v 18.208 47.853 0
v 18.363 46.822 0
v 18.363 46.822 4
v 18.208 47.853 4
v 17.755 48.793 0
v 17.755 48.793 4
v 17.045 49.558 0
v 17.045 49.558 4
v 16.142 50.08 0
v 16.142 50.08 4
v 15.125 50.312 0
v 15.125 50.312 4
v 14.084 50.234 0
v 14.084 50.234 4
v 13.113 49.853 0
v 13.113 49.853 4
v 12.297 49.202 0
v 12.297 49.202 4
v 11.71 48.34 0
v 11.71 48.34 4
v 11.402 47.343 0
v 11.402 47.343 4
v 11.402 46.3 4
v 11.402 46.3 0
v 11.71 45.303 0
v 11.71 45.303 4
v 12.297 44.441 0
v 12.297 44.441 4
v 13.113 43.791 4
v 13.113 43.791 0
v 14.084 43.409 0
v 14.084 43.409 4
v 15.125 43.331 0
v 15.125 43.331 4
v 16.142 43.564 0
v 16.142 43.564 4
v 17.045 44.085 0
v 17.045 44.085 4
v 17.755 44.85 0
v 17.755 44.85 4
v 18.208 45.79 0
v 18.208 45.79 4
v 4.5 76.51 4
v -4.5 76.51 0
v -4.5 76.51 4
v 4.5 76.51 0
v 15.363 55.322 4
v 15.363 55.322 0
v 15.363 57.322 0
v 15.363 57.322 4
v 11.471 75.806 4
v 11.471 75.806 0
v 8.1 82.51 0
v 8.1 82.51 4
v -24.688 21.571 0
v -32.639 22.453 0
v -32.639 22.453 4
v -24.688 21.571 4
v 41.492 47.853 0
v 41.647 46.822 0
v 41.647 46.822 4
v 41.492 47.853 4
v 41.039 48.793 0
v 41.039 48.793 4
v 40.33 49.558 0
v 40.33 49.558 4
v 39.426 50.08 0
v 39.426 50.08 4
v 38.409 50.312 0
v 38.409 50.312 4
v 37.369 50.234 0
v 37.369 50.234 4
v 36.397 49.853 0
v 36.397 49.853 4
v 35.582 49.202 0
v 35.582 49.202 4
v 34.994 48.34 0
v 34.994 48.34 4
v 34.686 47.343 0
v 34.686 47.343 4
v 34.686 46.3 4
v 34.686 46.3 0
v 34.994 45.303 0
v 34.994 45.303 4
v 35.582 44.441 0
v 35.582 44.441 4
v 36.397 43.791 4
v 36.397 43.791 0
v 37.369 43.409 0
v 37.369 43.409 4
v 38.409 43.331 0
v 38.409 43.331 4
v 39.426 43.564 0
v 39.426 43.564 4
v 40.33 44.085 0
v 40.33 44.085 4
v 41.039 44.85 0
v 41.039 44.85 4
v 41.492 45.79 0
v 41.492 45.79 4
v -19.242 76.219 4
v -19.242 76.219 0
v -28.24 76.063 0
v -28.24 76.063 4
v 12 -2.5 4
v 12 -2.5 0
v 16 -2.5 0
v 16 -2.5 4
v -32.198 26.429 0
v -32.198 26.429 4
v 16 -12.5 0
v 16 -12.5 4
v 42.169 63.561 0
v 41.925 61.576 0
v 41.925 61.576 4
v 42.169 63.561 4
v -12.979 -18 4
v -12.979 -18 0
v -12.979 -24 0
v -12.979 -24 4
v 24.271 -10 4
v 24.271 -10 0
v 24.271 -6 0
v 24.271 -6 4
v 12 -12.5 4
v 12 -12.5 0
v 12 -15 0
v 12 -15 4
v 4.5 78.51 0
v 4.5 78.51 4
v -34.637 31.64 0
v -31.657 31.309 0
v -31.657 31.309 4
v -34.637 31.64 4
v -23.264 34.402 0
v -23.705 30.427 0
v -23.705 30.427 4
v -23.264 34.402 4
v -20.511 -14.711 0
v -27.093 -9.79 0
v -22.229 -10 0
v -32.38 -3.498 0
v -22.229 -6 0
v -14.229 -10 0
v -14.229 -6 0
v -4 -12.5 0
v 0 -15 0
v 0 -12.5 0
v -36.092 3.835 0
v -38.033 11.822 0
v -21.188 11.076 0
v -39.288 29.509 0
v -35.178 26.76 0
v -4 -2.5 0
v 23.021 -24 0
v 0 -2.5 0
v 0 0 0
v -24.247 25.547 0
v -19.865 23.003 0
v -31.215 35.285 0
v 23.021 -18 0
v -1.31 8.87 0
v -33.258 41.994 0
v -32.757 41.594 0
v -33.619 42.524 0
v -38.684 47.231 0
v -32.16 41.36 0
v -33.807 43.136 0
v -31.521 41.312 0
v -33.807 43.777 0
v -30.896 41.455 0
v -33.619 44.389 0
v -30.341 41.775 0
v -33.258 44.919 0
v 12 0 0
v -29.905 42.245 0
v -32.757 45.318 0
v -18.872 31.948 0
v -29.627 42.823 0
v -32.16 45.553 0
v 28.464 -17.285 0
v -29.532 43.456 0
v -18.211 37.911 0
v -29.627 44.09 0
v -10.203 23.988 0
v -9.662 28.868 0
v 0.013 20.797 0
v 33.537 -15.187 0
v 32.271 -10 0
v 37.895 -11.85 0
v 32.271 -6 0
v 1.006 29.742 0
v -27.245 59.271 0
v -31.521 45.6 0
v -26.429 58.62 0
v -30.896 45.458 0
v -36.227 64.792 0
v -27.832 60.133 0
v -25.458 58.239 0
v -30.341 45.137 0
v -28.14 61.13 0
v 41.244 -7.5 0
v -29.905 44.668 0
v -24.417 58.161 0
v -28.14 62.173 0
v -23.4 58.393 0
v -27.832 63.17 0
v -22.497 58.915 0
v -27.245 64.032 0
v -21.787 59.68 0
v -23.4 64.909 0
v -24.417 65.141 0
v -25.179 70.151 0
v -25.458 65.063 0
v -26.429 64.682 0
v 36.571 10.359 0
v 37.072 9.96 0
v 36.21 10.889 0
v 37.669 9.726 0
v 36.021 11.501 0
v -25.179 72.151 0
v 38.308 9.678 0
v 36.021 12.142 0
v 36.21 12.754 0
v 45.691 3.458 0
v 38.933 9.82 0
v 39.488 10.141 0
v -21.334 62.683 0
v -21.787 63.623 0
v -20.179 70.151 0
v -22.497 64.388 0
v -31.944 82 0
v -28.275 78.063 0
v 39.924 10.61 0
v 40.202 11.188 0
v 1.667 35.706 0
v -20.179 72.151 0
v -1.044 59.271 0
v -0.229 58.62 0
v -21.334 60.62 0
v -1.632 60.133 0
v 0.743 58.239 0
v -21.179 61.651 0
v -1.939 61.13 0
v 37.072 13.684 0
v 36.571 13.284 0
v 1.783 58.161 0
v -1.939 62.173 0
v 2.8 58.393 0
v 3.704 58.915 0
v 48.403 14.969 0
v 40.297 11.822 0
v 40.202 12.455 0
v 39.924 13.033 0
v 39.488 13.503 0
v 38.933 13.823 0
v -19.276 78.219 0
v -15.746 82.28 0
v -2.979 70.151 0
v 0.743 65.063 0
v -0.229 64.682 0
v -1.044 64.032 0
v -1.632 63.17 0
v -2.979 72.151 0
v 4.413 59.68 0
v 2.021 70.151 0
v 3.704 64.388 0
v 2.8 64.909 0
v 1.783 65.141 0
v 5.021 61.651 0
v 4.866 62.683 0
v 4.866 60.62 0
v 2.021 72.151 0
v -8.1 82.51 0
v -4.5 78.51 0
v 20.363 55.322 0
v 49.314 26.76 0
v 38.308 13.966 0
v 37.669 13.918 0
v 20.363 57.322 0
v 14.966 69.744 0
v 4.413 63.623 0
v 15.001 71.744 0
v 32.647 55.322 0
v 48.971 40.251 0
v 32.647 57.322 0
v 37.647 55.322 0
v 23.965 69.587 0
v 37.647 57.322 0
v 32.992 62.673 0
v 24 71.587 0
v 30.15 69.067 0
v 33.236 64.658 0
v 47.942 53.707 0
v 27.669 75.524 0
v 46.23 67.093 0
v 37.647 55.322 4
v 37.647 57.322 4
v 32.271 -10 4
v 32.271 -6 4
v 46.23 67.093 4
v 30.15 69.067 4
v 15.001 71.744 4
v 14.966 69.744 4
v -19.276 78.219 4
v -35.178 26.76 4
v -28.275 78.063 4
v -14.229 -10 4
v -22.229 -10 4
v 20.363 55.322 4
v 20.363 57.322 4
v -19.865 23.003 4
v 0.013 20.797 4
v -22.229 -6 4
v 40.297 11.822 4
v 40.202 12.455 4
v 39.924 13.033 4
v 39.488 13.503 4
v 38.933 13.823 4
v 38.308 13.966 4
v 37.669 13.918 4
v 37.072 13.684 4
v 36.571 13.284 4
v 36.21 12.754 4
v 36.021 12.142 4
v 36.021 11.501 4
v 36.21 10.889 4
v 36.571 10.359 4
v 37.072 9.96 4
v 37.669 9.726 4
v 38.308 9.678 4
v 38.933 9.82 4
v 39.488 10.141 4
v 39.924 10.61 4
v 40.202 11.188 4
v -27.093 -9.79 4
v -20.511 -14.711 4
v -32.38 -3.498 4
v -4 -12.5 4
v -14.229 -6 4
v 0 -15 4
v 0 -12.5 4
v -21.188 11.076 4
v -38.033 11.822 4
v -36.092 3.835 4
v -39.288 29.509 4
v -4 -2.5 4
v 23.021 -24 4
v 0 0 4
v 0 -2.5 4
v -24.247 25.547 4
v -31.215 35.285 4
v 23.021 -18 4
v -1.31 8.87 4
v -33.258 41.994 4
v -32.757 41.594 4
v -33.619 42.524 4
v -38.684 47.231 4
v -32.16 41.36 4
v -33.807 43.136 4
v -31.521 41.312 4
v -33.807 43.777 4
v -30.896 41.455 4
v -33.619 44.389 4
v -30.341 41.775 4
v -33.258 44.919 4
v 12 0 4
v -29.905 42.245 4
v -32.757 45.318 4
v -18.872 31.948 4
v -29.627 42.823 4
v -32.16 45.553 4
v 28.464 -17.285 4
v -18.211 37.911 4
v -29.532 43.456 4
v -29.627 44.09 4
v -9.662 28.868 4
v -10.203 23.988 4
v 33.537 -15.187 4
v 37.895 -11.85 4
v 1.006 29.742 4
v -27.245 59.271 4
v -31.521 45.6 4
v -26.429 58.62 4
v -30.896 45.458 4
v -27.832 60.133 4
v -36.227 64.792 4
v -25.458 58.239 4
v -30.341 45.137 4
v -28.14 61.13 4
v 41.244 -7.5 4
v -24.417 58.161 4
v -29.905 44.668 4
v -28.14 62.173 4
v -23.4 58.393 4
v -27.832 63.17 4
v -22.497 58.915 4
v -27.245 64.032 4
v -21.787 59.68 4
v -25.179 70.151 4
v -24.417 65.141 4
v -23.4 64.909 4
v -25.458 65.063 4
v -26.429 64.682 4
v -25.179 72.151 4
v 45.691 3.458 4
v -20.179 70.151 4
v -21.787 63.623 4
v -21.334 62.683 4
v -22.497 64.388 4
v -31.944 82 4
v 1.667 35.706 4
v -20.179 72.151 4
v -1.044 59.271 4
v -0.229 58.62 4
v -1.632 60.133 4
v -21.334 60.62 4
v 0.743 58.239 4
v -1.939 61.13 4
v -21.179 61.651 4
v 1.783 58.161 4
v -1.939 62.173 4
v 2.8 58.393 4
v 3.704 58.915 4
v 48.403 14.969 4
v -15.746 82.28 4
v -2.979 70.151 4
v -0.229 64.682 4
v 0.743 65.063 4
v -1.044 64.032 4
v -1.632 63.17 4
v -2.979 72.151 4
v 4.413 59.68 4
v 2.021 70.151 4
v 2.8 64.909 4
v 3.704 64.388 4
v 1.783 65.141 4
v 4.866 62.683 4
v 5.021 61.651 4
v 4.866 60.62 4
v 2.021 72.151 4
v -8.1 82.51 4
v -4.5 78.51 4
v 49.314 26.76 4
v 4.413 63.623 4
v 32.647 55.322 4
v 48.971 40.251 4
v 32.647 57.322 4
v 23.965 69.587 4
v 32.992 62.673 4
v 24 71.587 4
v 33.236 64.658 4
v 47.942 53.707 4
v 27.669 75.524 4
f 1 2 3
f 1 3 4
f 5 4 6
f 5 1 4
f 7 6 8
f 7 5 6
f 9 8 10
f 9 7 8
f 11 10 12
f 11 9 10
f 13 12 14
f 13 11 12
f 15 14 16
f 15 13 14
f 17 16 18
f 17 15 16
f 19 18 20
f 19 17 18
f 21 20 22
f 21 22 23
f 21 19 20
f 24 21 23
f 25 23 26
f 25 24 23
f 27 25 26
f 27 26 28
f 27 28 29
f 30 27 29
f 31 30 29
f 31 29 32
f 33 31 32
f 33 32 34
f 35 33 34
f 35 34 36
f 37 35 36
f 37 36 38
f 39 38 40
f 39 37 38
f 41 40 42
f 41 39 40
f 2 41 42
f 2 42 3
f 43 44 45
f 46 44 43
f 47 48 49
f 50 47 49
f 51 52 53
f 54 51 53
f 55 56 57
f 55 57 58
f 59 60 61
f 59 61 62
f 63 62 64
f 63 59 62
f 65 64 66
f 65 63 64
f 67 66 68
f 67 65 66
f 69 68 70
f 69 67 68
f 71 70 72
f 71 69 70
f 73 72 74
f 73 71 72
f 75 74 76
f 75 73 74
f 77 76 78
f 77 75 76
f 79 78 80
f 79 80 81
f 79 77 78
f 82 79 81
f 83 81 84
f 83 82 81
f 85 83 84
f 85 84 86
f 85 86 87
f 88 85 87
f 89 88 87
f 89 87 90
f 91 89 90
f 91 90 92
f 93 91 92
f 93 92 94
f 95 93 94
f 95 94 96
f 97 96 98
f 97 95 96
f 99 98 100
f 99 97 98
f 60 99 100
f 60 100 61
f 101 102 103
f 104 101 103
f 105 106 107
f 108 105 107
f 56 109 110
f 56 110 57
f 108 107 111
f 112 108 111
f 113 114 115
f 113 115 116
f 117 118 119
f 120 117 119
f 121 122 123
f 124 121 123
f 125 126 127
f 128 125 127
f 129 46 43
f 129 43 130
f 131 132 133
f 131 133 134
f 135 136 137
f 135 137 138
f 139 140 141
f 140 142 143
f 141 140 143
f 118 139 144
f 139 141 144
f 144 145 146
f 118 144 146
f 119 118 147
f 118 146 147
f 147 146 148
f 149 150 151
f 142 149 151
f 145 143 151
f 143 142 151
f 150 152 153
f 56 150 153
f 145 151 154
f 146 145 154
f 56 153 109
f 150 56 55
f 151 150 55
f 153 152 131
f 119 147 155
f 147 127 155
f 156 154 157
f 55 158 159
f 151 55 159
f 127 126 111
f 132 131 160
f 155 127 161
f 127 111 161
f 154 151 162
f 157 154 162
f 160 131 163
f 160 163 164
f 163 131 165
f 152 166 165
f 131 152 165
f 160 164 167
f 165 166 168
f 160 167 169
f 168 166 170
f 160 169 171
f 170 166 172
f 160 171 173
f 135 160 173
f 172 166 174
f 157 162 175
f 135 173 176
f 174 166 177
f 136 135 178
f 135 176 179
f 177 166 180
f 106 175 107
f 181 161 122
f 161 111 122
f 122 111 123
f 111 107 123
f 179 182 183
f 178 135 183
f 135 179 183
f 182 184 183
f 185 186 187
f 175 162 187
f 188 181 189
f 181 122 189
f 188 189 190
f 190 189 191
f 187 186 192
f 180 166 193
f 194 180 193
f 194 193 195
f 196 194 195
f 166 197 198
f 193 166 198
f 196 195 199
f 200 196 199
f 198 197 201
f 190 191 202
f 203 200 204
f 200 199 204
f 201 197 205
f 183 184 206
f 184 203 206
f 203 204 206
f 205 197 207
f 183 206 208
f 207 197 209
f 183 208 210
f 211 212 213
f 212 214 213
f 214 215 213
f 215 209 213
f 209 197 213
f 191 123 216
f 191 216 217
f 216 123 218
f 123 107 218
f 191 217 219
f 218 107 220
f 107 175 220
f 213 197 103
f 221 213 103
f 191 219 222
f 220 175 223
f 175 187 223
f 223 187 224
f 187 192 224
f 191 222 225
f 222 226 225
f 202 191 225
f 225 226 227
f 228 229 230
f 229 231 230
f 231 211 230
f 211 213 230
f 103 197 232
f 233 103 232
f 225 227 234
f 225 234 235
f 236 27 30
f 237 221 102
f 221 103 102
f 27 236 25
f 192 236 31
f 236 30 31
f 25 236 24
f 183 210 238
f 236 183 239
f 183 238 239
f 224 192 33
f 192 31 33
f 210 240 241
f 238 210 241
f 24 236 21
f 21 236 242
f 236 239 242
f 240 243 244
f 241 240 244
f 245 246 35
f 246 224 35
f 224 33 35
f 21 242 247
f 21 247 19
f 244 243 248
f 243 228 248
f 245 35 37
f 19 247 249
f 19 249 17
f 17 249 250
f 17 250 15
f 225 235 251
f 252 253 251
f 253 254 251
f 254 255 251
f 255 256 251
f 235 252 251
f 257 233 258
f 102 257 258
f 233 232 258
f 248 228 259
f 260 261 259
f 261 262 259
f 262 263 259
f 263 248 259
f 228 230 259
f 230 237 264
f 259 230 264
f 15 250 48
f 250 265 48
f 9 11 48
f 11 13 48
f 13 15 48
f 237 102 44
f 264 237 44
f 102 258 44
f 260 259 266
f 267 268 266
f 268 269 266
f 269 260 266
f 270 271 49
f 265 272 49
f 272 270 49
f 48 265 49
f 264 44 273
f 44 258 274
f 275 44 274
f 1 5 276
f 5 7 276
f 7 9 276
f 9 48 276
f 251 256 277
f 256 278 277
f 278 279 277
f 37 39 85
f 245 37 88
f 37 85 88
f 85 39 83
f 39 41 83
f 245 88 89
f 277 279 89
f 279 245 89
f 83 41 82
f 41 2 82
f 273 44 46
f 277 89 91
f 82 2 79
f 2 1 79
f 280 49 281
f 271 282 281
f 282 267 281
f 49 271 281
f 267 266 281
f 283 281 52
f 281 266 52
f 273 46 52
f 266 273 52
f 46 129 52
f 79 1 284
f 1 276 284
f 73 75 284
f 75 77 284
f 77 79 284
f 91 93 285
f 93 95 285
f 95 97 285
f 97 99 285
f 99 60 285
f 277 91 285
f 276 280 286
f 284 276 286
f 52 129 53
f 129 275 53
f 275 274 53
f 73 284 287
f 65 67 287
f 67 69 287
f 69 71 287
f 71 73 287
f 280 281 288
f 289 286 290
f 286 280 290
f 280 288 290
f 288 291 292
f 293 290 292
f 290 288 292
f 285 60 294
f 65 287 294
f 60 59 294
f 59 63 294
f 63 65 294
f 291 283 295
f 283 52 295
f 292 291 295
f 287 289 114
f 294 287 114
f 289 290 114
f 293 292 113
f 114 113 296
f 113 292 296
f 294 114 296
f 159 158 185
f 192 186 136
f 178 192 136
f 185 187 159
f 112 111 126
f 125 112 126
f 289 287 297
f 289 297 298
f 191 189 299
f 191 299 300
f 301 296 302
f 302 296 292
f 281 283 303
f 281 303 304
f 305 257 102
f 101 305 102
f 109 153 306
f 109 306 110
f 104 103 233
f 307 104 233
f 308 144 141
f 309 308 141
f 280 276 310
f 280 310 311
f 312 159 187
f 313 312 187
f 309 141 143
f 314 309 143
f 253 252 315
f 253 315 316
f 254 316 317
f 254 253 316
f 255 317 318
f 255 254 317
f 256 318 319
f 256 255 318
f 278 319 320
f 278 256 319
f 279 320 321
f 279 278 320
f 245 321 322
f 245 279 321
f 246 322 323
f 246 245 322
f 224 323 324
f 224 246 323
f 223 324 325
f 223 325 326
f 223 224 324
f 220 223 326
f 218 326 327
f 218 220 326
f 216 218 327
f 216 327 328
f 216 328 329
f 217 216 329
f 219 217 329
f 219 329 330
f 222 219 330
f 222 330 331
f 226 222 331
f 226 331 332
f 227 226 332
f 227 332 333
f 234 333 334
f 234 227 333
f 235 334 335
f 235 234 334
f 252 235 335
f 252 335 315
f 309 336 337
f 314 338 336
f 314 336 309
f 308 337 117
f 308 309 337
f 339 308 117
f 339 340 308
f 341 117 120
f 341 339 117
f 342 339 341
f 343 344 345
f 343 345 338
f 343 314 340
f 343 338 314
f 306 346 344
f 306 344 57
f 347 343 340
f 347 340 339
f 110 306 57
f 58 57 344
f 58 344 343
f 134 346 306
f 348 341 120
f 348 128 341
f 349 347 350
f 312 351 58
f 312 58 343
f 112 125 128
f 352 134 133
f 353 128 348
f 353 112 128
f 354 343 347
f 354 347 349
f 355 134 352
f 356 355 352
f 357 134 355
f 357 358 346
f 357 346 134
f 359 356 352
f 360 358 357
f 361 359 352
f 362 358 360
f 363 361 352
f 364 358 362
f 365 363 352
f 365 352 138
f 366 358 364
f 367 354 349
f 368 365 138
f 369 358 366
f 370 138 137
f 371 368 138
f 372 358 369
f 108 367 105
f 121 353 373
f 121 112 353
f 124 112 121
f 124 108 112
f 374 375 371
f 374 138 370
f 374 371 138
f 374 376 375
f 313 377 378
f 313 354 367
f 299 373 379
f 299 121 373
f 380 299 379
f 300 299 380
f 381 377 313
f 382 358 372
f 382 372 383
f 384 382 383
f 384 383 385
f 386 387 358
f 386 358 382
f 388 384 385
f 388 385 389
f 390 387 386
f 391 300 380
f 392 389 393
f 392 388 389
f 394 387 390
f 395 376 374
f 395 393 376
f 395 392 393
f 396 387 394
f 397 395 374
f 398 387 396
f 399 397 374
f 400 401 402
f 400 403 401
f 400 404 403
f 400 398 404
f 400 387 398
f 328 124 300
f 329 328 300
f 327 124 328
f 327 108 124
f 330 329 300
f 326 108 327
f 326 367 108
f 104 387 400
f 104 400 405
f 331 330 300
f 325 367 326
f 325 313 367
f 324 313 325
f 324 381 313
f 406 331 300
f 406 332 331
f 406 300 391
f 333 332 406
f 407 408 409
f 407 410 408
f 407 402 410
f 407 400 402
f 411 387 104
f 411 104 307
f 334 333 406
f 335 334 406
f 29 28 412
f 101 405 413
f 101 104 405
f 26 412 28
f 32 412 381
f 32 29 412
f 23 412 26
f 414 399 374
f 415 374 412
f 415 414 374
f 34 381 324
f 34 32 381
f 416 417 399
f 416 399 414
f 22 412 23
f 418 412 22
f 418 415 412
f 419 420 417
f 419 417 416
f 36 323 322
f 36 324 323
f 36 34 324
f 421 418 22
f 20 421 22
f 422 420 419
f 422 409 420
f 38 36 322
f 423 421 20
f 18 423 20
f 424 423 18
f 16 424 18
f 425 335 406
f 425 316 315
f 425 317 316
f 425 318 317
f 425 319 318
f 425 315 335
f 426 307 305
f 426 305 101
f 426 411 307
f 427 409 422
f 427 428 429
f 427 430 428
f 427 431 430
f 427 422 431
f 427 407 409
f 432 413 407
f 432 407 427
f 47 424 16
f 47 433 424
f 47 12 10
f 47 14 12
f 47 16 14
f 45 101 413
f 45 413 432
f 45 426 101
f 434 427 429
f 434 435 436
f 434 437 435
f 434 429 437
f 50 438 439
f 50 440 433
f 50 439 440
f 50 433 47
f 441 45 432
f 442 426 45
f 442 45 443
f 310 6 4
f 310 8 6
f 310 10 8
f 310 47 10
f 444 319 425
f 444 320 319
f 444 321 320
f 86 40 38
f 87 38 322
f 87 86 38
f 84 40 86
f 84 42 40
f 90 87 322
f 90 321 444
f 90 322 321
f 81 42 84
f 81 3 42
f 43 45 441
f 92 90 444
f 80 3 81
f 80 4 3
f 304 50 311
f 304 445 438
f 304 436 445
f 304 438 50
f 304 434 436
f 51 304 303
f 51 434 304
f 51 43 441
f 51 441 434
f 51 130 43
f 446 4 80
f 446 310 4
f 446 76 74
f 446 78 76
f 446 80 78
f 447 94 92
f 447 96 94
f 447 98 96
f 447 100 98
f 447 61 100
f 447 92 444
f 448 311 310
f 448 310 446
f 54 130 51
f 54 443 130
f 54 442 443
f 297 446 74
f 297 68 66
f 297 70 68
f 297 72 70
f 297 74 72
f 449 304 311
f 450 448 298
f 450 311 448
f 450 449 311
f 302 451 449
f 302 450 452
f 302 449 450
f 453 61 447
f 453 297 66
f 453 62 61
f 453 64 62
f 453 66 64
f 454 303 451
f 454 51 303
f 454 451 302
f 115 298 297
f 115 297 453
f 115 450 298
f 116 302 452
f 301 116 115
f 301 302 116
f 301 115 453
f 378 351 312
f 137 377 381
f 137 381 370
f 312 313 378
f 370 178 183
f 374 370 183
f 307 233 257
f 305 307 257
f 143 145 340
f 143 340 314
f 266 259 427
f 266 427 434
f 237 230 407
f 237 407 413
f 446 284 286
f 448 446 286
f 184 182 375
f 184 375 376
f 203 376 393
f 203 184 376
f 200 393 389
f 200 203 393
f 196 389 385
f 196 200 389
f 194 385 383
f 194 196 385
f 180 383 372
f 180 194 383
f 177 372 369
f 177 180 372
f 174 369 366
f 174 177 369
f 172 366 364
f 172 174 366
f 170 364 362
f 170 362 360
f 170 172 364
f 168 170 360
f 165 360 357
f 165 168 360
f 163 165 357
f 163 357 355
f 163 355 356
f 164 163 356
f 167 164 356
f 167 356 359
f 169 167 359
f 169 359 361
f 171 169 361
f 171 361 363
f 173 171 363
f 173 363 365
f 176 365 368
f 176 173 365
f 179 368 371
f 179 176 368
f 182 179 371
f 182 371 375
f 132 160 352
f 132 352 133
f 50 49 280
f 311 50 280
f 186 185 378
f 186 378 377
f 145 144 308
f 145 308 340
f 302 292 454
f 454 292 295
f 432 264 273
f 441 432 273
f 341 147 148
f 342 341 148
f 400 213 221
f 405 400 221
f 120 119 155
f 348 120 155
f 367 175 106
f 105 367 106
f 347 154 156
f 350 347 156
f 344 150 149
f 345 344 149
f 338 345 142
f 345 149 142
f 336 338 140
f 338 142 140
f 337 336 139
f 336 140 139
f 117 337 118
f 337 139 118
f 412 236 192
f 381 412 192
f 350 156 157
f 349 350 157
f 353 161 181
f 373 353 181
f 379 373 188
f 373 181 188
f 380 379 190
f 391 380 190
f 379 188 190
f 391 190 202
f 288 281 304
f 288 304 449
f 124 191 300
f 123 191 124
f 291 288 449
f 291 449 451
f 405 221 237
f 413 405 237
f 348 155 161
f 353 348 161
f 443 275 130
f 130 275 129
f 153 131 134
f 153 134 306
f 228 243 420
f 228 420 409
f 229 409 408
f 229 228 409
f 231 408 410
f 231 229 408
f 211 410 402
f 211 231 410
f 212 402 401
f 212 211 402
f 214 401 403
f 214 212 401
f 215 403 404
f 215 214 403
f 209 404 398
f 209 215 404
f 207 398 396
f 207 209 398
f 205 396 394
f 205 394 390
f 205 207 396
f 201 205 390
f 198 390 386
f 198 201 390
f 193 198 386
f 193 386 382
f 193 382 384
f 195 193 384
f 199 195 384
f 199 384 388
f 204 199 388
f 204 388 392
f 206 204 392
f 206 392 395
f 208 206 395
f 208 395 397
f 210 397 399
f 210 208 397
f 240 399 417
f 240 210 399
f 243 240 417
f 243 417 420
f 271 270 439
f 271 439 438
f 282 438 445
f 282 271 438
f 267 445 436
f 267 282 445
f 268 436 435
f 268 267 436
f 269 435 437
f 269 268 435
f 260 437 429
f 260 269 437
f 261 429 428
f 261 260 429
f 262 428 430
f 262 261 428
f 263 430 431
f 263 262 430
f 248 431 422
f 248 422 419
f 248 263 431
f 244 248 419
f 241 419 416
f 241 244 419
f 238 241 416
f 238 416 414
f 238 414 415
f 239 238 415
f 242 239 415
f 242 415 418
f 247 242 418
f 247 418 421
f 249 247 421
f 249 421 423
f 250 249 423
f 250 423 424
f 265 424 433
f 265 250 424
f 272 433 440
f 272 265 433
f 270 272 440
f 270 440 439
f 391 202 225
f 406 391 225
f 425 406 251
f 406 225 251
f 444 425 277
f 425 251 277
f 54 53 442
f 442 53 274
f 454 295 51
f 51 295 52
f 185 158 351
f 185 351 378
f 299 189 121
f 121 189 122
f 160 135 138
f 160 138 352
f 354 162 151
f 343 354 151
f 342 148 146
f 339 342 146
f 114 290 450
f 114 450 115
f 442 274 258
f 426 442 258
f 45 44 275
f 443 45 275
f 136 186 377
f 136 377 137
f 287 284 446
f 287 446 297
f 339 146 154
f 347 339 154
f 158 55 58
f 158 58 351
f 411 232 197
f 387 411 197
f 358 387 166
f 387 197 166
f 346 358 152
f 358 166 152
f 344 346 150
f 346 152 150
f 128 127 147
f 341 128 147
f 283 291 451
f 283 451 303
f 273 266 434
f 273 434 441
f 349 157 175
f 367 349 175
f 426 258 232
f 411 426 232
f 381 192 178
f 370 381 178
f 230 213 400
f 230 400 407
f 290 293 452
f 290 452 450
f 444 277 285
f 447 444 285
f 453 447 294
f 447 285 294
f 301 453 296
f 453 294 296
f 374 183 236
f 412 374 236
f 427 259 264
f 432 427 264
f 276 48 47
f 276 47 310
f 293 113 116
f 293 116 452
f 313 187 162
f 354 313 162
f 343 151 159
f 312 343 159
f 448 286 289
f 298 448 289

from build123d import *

# Parameters (mm, degrees)
SKETCH1_R           = 2.15
SKETCH1_R_2         = 3.5
SKETCH1_W           = 9.000072
SKETCH1_H           = 2
SKETCH1_W_2         = 5
BOSS_EXTRUDE1_DEPTH = 4
SKETCH2_W           = 8
SKETCH2_H           = 4
CUT_EXTRUDE1_DEPTH  = 5


with BuildPart() as part:
    # Sketch1 → Boss-Extrude1 (new body)
    with BuildSketch(Plane.XY):
        with BuildLine():
            Line((-12.978640908, -18), (-12.978640908, -24))
            Line((-12.978640908, -24), (23.021359092, -24))
            Line((23.021359092, -24), (23.021359092, -18))
            ThreePointArc((23.021359092, -18), (33.536808213, -15.187172163), (41.243562055, -7.5))
            ThreePointArc((41.243562055, -7.5), (47.269076761, 9.160930487), (49.313899811, 26.759570515))
            ThreePointArc((49.313899811, 26.759570515), (48.54170687, 46.985091914), (46.229623828, 67.092858318))
            Line((46.229623828, 67.092858318), (30.150376172, 69.067141682))
            Line((30.150376172, 69.067141682), (27.668766331, 75.523635508))
            Line((27.668766331, 75.523635508), (11.471233669, 75.806364492))
            Line((11.471233669, 75.806364492), (8.1, 82.51))
            Line((8.1, 82.51), (-8.1, 82.51))
            Line((-8.1, 82.51), (-15.746217975, 82.280462515))
            Line((-15.746217975, 82.280462515), (-31.943782025, 81.999537485))
            ThreePointArc((-31.943782025, 81.999537485), (-38.683922922, 47.231229605), (-38.032696315, 11.821617405))
            ThreePointArc((-38.032696315, 11.821617405), (-29.918009554, -6.796134249), (-12.978640908, -18))
        make_face()
        with Locations((38.147341743, 11.821617405)):
            Circle(SKETCH1_R, mode=Mode.SUBTRACT)
        with Locations((-24.678960076, 61.651218734)):
            Circle(SKETCH1_R_2, mode=Mode.SUBTRACT)
        with Locations((1.521420673, 61.651218734)):
            Circle(SKETCH1_R_2, mode=Mode.SUBTRACT)
        with Locations((14.86306514, 46.821617405)):
            Circle(SKETCH1_R_2, mode=Mode.SUBTRACT)
        with Locations((38.147341743, 46.821617405)):
            Circle(SKETCH1_R_2, mode=Mode.SUBTRACT)
        with Locations((-31.681501662, 43.456405989)):
            Circle(SKETCH1_R, mode=Mode.SUBTRACT)
        with Locations((0, 77.51)):
            Rectangle(SKETCH1_W, SKETCH1_H, mode=Mode.SUBTRACT)
        Polygon((-4, -2.5), (0, -2.5), (0, 0), (12, 0), (12, -2.5), (16, -2.5), (16, -12.5), (12, -12.5), (12, -15), (0, -15), (0, -12.5), (-4, -12.5), align=None, mode=Mode.SUBTRACT)
        with Locations((35.147341743, 56.321617405)):
            Rectangle(SKETCH1_W_2, SKETCH1_H, mode=Mode.SUBTRACT)
        Polygon((-28.274995137, 78.062566115), (-19.276276454, 78.218636824), (-19.241594351, 76.218937559), (-28.240313034, 76.062866849), align=None, mode=Mode.SUBTRACT)
        with Locations((17.86306514, 56.321617405)):
            Rectangle(SKETCH1_W_2, SKETCH1_H, mode=Mode.SUBTRACT)
        with Locations((-0.478579327, 71.151218734)):
            Rectangle(SKETCH1_W_2, SKETCH1_H, mode=Mode.SUBTRACT)
        Polygon((15.000839752, 71.744145677), (14.965934939, 69.744450286), (23.964636184, 69.587377372), (23.999540997, 71.587072762), align=None, mode=Mode.SUBTRACT)
        Polygon((42.16901604, 63.561398961), (33.236029212, 64.658231826), (32.992290526, 62.673139523), (41.925277354, 61.576306658), align=None, mode=Mode.SUBTRACT)
        Polygon((1.667459367, 35.705611754), (1.005748572, 29.742211816), (-18.872251222, 31.947914464), (-18.210540428, 37.911314402), align=None, mode=Mode.SUBTRACT)
        with Locations((-22.678960076, 71.151218734)):
            Rectangle(SKETCH1_W_2, SKETCH1_H, mode=Mode.SUBTRACT)
        Polygon((0.013182381, 20.797111909), (-1.310239208, 8.870312032), (-21.188239002, 11.076014679), (-19.864817414, 23.002814556), align=None, mode=Mode.SUBTRACT)
        Polygon((-10.203, 23.988271038), (-9.6615, 28.868319988), (-23.705306855, 30.426648908), (-23.264166325, 34.402248867), (-31.215366243, 35.284529926), (-31.656506773, 31.308929968), (-34.636711633, 31.639619464), (-35.178211633, 26.759570515), (-32.198006773, 26.428881018), (-32.639147302, 22.453281059), (-24.687947384, 21.571), (-24.246806855, 25.546599959), align=None, mode=Mode.SUBTRACT)
    extrude(amount=BOSS_EXTRUDE1_DEPTH)

    # Sketch2 → Cut-Extrude1 (cut, through all)
    with BuildSketch(Plane(origin=(0, 0, 0), x_dir=(-1, 0, 0), z_dir=(0, 0, -1))):
        with Locations((-28.271359092, -8)):
            Rectangle(SKETCH2_W, SKETCH2_H)
        with Locations((18.228640908, -8)):
            Rectangle(SKETCH2_W, SKETCH2_H)
    extrude(amount=-CUT_EXTRUDE1_DEPTH, mode=Mode.SUBTRACT)


solid = part.part
